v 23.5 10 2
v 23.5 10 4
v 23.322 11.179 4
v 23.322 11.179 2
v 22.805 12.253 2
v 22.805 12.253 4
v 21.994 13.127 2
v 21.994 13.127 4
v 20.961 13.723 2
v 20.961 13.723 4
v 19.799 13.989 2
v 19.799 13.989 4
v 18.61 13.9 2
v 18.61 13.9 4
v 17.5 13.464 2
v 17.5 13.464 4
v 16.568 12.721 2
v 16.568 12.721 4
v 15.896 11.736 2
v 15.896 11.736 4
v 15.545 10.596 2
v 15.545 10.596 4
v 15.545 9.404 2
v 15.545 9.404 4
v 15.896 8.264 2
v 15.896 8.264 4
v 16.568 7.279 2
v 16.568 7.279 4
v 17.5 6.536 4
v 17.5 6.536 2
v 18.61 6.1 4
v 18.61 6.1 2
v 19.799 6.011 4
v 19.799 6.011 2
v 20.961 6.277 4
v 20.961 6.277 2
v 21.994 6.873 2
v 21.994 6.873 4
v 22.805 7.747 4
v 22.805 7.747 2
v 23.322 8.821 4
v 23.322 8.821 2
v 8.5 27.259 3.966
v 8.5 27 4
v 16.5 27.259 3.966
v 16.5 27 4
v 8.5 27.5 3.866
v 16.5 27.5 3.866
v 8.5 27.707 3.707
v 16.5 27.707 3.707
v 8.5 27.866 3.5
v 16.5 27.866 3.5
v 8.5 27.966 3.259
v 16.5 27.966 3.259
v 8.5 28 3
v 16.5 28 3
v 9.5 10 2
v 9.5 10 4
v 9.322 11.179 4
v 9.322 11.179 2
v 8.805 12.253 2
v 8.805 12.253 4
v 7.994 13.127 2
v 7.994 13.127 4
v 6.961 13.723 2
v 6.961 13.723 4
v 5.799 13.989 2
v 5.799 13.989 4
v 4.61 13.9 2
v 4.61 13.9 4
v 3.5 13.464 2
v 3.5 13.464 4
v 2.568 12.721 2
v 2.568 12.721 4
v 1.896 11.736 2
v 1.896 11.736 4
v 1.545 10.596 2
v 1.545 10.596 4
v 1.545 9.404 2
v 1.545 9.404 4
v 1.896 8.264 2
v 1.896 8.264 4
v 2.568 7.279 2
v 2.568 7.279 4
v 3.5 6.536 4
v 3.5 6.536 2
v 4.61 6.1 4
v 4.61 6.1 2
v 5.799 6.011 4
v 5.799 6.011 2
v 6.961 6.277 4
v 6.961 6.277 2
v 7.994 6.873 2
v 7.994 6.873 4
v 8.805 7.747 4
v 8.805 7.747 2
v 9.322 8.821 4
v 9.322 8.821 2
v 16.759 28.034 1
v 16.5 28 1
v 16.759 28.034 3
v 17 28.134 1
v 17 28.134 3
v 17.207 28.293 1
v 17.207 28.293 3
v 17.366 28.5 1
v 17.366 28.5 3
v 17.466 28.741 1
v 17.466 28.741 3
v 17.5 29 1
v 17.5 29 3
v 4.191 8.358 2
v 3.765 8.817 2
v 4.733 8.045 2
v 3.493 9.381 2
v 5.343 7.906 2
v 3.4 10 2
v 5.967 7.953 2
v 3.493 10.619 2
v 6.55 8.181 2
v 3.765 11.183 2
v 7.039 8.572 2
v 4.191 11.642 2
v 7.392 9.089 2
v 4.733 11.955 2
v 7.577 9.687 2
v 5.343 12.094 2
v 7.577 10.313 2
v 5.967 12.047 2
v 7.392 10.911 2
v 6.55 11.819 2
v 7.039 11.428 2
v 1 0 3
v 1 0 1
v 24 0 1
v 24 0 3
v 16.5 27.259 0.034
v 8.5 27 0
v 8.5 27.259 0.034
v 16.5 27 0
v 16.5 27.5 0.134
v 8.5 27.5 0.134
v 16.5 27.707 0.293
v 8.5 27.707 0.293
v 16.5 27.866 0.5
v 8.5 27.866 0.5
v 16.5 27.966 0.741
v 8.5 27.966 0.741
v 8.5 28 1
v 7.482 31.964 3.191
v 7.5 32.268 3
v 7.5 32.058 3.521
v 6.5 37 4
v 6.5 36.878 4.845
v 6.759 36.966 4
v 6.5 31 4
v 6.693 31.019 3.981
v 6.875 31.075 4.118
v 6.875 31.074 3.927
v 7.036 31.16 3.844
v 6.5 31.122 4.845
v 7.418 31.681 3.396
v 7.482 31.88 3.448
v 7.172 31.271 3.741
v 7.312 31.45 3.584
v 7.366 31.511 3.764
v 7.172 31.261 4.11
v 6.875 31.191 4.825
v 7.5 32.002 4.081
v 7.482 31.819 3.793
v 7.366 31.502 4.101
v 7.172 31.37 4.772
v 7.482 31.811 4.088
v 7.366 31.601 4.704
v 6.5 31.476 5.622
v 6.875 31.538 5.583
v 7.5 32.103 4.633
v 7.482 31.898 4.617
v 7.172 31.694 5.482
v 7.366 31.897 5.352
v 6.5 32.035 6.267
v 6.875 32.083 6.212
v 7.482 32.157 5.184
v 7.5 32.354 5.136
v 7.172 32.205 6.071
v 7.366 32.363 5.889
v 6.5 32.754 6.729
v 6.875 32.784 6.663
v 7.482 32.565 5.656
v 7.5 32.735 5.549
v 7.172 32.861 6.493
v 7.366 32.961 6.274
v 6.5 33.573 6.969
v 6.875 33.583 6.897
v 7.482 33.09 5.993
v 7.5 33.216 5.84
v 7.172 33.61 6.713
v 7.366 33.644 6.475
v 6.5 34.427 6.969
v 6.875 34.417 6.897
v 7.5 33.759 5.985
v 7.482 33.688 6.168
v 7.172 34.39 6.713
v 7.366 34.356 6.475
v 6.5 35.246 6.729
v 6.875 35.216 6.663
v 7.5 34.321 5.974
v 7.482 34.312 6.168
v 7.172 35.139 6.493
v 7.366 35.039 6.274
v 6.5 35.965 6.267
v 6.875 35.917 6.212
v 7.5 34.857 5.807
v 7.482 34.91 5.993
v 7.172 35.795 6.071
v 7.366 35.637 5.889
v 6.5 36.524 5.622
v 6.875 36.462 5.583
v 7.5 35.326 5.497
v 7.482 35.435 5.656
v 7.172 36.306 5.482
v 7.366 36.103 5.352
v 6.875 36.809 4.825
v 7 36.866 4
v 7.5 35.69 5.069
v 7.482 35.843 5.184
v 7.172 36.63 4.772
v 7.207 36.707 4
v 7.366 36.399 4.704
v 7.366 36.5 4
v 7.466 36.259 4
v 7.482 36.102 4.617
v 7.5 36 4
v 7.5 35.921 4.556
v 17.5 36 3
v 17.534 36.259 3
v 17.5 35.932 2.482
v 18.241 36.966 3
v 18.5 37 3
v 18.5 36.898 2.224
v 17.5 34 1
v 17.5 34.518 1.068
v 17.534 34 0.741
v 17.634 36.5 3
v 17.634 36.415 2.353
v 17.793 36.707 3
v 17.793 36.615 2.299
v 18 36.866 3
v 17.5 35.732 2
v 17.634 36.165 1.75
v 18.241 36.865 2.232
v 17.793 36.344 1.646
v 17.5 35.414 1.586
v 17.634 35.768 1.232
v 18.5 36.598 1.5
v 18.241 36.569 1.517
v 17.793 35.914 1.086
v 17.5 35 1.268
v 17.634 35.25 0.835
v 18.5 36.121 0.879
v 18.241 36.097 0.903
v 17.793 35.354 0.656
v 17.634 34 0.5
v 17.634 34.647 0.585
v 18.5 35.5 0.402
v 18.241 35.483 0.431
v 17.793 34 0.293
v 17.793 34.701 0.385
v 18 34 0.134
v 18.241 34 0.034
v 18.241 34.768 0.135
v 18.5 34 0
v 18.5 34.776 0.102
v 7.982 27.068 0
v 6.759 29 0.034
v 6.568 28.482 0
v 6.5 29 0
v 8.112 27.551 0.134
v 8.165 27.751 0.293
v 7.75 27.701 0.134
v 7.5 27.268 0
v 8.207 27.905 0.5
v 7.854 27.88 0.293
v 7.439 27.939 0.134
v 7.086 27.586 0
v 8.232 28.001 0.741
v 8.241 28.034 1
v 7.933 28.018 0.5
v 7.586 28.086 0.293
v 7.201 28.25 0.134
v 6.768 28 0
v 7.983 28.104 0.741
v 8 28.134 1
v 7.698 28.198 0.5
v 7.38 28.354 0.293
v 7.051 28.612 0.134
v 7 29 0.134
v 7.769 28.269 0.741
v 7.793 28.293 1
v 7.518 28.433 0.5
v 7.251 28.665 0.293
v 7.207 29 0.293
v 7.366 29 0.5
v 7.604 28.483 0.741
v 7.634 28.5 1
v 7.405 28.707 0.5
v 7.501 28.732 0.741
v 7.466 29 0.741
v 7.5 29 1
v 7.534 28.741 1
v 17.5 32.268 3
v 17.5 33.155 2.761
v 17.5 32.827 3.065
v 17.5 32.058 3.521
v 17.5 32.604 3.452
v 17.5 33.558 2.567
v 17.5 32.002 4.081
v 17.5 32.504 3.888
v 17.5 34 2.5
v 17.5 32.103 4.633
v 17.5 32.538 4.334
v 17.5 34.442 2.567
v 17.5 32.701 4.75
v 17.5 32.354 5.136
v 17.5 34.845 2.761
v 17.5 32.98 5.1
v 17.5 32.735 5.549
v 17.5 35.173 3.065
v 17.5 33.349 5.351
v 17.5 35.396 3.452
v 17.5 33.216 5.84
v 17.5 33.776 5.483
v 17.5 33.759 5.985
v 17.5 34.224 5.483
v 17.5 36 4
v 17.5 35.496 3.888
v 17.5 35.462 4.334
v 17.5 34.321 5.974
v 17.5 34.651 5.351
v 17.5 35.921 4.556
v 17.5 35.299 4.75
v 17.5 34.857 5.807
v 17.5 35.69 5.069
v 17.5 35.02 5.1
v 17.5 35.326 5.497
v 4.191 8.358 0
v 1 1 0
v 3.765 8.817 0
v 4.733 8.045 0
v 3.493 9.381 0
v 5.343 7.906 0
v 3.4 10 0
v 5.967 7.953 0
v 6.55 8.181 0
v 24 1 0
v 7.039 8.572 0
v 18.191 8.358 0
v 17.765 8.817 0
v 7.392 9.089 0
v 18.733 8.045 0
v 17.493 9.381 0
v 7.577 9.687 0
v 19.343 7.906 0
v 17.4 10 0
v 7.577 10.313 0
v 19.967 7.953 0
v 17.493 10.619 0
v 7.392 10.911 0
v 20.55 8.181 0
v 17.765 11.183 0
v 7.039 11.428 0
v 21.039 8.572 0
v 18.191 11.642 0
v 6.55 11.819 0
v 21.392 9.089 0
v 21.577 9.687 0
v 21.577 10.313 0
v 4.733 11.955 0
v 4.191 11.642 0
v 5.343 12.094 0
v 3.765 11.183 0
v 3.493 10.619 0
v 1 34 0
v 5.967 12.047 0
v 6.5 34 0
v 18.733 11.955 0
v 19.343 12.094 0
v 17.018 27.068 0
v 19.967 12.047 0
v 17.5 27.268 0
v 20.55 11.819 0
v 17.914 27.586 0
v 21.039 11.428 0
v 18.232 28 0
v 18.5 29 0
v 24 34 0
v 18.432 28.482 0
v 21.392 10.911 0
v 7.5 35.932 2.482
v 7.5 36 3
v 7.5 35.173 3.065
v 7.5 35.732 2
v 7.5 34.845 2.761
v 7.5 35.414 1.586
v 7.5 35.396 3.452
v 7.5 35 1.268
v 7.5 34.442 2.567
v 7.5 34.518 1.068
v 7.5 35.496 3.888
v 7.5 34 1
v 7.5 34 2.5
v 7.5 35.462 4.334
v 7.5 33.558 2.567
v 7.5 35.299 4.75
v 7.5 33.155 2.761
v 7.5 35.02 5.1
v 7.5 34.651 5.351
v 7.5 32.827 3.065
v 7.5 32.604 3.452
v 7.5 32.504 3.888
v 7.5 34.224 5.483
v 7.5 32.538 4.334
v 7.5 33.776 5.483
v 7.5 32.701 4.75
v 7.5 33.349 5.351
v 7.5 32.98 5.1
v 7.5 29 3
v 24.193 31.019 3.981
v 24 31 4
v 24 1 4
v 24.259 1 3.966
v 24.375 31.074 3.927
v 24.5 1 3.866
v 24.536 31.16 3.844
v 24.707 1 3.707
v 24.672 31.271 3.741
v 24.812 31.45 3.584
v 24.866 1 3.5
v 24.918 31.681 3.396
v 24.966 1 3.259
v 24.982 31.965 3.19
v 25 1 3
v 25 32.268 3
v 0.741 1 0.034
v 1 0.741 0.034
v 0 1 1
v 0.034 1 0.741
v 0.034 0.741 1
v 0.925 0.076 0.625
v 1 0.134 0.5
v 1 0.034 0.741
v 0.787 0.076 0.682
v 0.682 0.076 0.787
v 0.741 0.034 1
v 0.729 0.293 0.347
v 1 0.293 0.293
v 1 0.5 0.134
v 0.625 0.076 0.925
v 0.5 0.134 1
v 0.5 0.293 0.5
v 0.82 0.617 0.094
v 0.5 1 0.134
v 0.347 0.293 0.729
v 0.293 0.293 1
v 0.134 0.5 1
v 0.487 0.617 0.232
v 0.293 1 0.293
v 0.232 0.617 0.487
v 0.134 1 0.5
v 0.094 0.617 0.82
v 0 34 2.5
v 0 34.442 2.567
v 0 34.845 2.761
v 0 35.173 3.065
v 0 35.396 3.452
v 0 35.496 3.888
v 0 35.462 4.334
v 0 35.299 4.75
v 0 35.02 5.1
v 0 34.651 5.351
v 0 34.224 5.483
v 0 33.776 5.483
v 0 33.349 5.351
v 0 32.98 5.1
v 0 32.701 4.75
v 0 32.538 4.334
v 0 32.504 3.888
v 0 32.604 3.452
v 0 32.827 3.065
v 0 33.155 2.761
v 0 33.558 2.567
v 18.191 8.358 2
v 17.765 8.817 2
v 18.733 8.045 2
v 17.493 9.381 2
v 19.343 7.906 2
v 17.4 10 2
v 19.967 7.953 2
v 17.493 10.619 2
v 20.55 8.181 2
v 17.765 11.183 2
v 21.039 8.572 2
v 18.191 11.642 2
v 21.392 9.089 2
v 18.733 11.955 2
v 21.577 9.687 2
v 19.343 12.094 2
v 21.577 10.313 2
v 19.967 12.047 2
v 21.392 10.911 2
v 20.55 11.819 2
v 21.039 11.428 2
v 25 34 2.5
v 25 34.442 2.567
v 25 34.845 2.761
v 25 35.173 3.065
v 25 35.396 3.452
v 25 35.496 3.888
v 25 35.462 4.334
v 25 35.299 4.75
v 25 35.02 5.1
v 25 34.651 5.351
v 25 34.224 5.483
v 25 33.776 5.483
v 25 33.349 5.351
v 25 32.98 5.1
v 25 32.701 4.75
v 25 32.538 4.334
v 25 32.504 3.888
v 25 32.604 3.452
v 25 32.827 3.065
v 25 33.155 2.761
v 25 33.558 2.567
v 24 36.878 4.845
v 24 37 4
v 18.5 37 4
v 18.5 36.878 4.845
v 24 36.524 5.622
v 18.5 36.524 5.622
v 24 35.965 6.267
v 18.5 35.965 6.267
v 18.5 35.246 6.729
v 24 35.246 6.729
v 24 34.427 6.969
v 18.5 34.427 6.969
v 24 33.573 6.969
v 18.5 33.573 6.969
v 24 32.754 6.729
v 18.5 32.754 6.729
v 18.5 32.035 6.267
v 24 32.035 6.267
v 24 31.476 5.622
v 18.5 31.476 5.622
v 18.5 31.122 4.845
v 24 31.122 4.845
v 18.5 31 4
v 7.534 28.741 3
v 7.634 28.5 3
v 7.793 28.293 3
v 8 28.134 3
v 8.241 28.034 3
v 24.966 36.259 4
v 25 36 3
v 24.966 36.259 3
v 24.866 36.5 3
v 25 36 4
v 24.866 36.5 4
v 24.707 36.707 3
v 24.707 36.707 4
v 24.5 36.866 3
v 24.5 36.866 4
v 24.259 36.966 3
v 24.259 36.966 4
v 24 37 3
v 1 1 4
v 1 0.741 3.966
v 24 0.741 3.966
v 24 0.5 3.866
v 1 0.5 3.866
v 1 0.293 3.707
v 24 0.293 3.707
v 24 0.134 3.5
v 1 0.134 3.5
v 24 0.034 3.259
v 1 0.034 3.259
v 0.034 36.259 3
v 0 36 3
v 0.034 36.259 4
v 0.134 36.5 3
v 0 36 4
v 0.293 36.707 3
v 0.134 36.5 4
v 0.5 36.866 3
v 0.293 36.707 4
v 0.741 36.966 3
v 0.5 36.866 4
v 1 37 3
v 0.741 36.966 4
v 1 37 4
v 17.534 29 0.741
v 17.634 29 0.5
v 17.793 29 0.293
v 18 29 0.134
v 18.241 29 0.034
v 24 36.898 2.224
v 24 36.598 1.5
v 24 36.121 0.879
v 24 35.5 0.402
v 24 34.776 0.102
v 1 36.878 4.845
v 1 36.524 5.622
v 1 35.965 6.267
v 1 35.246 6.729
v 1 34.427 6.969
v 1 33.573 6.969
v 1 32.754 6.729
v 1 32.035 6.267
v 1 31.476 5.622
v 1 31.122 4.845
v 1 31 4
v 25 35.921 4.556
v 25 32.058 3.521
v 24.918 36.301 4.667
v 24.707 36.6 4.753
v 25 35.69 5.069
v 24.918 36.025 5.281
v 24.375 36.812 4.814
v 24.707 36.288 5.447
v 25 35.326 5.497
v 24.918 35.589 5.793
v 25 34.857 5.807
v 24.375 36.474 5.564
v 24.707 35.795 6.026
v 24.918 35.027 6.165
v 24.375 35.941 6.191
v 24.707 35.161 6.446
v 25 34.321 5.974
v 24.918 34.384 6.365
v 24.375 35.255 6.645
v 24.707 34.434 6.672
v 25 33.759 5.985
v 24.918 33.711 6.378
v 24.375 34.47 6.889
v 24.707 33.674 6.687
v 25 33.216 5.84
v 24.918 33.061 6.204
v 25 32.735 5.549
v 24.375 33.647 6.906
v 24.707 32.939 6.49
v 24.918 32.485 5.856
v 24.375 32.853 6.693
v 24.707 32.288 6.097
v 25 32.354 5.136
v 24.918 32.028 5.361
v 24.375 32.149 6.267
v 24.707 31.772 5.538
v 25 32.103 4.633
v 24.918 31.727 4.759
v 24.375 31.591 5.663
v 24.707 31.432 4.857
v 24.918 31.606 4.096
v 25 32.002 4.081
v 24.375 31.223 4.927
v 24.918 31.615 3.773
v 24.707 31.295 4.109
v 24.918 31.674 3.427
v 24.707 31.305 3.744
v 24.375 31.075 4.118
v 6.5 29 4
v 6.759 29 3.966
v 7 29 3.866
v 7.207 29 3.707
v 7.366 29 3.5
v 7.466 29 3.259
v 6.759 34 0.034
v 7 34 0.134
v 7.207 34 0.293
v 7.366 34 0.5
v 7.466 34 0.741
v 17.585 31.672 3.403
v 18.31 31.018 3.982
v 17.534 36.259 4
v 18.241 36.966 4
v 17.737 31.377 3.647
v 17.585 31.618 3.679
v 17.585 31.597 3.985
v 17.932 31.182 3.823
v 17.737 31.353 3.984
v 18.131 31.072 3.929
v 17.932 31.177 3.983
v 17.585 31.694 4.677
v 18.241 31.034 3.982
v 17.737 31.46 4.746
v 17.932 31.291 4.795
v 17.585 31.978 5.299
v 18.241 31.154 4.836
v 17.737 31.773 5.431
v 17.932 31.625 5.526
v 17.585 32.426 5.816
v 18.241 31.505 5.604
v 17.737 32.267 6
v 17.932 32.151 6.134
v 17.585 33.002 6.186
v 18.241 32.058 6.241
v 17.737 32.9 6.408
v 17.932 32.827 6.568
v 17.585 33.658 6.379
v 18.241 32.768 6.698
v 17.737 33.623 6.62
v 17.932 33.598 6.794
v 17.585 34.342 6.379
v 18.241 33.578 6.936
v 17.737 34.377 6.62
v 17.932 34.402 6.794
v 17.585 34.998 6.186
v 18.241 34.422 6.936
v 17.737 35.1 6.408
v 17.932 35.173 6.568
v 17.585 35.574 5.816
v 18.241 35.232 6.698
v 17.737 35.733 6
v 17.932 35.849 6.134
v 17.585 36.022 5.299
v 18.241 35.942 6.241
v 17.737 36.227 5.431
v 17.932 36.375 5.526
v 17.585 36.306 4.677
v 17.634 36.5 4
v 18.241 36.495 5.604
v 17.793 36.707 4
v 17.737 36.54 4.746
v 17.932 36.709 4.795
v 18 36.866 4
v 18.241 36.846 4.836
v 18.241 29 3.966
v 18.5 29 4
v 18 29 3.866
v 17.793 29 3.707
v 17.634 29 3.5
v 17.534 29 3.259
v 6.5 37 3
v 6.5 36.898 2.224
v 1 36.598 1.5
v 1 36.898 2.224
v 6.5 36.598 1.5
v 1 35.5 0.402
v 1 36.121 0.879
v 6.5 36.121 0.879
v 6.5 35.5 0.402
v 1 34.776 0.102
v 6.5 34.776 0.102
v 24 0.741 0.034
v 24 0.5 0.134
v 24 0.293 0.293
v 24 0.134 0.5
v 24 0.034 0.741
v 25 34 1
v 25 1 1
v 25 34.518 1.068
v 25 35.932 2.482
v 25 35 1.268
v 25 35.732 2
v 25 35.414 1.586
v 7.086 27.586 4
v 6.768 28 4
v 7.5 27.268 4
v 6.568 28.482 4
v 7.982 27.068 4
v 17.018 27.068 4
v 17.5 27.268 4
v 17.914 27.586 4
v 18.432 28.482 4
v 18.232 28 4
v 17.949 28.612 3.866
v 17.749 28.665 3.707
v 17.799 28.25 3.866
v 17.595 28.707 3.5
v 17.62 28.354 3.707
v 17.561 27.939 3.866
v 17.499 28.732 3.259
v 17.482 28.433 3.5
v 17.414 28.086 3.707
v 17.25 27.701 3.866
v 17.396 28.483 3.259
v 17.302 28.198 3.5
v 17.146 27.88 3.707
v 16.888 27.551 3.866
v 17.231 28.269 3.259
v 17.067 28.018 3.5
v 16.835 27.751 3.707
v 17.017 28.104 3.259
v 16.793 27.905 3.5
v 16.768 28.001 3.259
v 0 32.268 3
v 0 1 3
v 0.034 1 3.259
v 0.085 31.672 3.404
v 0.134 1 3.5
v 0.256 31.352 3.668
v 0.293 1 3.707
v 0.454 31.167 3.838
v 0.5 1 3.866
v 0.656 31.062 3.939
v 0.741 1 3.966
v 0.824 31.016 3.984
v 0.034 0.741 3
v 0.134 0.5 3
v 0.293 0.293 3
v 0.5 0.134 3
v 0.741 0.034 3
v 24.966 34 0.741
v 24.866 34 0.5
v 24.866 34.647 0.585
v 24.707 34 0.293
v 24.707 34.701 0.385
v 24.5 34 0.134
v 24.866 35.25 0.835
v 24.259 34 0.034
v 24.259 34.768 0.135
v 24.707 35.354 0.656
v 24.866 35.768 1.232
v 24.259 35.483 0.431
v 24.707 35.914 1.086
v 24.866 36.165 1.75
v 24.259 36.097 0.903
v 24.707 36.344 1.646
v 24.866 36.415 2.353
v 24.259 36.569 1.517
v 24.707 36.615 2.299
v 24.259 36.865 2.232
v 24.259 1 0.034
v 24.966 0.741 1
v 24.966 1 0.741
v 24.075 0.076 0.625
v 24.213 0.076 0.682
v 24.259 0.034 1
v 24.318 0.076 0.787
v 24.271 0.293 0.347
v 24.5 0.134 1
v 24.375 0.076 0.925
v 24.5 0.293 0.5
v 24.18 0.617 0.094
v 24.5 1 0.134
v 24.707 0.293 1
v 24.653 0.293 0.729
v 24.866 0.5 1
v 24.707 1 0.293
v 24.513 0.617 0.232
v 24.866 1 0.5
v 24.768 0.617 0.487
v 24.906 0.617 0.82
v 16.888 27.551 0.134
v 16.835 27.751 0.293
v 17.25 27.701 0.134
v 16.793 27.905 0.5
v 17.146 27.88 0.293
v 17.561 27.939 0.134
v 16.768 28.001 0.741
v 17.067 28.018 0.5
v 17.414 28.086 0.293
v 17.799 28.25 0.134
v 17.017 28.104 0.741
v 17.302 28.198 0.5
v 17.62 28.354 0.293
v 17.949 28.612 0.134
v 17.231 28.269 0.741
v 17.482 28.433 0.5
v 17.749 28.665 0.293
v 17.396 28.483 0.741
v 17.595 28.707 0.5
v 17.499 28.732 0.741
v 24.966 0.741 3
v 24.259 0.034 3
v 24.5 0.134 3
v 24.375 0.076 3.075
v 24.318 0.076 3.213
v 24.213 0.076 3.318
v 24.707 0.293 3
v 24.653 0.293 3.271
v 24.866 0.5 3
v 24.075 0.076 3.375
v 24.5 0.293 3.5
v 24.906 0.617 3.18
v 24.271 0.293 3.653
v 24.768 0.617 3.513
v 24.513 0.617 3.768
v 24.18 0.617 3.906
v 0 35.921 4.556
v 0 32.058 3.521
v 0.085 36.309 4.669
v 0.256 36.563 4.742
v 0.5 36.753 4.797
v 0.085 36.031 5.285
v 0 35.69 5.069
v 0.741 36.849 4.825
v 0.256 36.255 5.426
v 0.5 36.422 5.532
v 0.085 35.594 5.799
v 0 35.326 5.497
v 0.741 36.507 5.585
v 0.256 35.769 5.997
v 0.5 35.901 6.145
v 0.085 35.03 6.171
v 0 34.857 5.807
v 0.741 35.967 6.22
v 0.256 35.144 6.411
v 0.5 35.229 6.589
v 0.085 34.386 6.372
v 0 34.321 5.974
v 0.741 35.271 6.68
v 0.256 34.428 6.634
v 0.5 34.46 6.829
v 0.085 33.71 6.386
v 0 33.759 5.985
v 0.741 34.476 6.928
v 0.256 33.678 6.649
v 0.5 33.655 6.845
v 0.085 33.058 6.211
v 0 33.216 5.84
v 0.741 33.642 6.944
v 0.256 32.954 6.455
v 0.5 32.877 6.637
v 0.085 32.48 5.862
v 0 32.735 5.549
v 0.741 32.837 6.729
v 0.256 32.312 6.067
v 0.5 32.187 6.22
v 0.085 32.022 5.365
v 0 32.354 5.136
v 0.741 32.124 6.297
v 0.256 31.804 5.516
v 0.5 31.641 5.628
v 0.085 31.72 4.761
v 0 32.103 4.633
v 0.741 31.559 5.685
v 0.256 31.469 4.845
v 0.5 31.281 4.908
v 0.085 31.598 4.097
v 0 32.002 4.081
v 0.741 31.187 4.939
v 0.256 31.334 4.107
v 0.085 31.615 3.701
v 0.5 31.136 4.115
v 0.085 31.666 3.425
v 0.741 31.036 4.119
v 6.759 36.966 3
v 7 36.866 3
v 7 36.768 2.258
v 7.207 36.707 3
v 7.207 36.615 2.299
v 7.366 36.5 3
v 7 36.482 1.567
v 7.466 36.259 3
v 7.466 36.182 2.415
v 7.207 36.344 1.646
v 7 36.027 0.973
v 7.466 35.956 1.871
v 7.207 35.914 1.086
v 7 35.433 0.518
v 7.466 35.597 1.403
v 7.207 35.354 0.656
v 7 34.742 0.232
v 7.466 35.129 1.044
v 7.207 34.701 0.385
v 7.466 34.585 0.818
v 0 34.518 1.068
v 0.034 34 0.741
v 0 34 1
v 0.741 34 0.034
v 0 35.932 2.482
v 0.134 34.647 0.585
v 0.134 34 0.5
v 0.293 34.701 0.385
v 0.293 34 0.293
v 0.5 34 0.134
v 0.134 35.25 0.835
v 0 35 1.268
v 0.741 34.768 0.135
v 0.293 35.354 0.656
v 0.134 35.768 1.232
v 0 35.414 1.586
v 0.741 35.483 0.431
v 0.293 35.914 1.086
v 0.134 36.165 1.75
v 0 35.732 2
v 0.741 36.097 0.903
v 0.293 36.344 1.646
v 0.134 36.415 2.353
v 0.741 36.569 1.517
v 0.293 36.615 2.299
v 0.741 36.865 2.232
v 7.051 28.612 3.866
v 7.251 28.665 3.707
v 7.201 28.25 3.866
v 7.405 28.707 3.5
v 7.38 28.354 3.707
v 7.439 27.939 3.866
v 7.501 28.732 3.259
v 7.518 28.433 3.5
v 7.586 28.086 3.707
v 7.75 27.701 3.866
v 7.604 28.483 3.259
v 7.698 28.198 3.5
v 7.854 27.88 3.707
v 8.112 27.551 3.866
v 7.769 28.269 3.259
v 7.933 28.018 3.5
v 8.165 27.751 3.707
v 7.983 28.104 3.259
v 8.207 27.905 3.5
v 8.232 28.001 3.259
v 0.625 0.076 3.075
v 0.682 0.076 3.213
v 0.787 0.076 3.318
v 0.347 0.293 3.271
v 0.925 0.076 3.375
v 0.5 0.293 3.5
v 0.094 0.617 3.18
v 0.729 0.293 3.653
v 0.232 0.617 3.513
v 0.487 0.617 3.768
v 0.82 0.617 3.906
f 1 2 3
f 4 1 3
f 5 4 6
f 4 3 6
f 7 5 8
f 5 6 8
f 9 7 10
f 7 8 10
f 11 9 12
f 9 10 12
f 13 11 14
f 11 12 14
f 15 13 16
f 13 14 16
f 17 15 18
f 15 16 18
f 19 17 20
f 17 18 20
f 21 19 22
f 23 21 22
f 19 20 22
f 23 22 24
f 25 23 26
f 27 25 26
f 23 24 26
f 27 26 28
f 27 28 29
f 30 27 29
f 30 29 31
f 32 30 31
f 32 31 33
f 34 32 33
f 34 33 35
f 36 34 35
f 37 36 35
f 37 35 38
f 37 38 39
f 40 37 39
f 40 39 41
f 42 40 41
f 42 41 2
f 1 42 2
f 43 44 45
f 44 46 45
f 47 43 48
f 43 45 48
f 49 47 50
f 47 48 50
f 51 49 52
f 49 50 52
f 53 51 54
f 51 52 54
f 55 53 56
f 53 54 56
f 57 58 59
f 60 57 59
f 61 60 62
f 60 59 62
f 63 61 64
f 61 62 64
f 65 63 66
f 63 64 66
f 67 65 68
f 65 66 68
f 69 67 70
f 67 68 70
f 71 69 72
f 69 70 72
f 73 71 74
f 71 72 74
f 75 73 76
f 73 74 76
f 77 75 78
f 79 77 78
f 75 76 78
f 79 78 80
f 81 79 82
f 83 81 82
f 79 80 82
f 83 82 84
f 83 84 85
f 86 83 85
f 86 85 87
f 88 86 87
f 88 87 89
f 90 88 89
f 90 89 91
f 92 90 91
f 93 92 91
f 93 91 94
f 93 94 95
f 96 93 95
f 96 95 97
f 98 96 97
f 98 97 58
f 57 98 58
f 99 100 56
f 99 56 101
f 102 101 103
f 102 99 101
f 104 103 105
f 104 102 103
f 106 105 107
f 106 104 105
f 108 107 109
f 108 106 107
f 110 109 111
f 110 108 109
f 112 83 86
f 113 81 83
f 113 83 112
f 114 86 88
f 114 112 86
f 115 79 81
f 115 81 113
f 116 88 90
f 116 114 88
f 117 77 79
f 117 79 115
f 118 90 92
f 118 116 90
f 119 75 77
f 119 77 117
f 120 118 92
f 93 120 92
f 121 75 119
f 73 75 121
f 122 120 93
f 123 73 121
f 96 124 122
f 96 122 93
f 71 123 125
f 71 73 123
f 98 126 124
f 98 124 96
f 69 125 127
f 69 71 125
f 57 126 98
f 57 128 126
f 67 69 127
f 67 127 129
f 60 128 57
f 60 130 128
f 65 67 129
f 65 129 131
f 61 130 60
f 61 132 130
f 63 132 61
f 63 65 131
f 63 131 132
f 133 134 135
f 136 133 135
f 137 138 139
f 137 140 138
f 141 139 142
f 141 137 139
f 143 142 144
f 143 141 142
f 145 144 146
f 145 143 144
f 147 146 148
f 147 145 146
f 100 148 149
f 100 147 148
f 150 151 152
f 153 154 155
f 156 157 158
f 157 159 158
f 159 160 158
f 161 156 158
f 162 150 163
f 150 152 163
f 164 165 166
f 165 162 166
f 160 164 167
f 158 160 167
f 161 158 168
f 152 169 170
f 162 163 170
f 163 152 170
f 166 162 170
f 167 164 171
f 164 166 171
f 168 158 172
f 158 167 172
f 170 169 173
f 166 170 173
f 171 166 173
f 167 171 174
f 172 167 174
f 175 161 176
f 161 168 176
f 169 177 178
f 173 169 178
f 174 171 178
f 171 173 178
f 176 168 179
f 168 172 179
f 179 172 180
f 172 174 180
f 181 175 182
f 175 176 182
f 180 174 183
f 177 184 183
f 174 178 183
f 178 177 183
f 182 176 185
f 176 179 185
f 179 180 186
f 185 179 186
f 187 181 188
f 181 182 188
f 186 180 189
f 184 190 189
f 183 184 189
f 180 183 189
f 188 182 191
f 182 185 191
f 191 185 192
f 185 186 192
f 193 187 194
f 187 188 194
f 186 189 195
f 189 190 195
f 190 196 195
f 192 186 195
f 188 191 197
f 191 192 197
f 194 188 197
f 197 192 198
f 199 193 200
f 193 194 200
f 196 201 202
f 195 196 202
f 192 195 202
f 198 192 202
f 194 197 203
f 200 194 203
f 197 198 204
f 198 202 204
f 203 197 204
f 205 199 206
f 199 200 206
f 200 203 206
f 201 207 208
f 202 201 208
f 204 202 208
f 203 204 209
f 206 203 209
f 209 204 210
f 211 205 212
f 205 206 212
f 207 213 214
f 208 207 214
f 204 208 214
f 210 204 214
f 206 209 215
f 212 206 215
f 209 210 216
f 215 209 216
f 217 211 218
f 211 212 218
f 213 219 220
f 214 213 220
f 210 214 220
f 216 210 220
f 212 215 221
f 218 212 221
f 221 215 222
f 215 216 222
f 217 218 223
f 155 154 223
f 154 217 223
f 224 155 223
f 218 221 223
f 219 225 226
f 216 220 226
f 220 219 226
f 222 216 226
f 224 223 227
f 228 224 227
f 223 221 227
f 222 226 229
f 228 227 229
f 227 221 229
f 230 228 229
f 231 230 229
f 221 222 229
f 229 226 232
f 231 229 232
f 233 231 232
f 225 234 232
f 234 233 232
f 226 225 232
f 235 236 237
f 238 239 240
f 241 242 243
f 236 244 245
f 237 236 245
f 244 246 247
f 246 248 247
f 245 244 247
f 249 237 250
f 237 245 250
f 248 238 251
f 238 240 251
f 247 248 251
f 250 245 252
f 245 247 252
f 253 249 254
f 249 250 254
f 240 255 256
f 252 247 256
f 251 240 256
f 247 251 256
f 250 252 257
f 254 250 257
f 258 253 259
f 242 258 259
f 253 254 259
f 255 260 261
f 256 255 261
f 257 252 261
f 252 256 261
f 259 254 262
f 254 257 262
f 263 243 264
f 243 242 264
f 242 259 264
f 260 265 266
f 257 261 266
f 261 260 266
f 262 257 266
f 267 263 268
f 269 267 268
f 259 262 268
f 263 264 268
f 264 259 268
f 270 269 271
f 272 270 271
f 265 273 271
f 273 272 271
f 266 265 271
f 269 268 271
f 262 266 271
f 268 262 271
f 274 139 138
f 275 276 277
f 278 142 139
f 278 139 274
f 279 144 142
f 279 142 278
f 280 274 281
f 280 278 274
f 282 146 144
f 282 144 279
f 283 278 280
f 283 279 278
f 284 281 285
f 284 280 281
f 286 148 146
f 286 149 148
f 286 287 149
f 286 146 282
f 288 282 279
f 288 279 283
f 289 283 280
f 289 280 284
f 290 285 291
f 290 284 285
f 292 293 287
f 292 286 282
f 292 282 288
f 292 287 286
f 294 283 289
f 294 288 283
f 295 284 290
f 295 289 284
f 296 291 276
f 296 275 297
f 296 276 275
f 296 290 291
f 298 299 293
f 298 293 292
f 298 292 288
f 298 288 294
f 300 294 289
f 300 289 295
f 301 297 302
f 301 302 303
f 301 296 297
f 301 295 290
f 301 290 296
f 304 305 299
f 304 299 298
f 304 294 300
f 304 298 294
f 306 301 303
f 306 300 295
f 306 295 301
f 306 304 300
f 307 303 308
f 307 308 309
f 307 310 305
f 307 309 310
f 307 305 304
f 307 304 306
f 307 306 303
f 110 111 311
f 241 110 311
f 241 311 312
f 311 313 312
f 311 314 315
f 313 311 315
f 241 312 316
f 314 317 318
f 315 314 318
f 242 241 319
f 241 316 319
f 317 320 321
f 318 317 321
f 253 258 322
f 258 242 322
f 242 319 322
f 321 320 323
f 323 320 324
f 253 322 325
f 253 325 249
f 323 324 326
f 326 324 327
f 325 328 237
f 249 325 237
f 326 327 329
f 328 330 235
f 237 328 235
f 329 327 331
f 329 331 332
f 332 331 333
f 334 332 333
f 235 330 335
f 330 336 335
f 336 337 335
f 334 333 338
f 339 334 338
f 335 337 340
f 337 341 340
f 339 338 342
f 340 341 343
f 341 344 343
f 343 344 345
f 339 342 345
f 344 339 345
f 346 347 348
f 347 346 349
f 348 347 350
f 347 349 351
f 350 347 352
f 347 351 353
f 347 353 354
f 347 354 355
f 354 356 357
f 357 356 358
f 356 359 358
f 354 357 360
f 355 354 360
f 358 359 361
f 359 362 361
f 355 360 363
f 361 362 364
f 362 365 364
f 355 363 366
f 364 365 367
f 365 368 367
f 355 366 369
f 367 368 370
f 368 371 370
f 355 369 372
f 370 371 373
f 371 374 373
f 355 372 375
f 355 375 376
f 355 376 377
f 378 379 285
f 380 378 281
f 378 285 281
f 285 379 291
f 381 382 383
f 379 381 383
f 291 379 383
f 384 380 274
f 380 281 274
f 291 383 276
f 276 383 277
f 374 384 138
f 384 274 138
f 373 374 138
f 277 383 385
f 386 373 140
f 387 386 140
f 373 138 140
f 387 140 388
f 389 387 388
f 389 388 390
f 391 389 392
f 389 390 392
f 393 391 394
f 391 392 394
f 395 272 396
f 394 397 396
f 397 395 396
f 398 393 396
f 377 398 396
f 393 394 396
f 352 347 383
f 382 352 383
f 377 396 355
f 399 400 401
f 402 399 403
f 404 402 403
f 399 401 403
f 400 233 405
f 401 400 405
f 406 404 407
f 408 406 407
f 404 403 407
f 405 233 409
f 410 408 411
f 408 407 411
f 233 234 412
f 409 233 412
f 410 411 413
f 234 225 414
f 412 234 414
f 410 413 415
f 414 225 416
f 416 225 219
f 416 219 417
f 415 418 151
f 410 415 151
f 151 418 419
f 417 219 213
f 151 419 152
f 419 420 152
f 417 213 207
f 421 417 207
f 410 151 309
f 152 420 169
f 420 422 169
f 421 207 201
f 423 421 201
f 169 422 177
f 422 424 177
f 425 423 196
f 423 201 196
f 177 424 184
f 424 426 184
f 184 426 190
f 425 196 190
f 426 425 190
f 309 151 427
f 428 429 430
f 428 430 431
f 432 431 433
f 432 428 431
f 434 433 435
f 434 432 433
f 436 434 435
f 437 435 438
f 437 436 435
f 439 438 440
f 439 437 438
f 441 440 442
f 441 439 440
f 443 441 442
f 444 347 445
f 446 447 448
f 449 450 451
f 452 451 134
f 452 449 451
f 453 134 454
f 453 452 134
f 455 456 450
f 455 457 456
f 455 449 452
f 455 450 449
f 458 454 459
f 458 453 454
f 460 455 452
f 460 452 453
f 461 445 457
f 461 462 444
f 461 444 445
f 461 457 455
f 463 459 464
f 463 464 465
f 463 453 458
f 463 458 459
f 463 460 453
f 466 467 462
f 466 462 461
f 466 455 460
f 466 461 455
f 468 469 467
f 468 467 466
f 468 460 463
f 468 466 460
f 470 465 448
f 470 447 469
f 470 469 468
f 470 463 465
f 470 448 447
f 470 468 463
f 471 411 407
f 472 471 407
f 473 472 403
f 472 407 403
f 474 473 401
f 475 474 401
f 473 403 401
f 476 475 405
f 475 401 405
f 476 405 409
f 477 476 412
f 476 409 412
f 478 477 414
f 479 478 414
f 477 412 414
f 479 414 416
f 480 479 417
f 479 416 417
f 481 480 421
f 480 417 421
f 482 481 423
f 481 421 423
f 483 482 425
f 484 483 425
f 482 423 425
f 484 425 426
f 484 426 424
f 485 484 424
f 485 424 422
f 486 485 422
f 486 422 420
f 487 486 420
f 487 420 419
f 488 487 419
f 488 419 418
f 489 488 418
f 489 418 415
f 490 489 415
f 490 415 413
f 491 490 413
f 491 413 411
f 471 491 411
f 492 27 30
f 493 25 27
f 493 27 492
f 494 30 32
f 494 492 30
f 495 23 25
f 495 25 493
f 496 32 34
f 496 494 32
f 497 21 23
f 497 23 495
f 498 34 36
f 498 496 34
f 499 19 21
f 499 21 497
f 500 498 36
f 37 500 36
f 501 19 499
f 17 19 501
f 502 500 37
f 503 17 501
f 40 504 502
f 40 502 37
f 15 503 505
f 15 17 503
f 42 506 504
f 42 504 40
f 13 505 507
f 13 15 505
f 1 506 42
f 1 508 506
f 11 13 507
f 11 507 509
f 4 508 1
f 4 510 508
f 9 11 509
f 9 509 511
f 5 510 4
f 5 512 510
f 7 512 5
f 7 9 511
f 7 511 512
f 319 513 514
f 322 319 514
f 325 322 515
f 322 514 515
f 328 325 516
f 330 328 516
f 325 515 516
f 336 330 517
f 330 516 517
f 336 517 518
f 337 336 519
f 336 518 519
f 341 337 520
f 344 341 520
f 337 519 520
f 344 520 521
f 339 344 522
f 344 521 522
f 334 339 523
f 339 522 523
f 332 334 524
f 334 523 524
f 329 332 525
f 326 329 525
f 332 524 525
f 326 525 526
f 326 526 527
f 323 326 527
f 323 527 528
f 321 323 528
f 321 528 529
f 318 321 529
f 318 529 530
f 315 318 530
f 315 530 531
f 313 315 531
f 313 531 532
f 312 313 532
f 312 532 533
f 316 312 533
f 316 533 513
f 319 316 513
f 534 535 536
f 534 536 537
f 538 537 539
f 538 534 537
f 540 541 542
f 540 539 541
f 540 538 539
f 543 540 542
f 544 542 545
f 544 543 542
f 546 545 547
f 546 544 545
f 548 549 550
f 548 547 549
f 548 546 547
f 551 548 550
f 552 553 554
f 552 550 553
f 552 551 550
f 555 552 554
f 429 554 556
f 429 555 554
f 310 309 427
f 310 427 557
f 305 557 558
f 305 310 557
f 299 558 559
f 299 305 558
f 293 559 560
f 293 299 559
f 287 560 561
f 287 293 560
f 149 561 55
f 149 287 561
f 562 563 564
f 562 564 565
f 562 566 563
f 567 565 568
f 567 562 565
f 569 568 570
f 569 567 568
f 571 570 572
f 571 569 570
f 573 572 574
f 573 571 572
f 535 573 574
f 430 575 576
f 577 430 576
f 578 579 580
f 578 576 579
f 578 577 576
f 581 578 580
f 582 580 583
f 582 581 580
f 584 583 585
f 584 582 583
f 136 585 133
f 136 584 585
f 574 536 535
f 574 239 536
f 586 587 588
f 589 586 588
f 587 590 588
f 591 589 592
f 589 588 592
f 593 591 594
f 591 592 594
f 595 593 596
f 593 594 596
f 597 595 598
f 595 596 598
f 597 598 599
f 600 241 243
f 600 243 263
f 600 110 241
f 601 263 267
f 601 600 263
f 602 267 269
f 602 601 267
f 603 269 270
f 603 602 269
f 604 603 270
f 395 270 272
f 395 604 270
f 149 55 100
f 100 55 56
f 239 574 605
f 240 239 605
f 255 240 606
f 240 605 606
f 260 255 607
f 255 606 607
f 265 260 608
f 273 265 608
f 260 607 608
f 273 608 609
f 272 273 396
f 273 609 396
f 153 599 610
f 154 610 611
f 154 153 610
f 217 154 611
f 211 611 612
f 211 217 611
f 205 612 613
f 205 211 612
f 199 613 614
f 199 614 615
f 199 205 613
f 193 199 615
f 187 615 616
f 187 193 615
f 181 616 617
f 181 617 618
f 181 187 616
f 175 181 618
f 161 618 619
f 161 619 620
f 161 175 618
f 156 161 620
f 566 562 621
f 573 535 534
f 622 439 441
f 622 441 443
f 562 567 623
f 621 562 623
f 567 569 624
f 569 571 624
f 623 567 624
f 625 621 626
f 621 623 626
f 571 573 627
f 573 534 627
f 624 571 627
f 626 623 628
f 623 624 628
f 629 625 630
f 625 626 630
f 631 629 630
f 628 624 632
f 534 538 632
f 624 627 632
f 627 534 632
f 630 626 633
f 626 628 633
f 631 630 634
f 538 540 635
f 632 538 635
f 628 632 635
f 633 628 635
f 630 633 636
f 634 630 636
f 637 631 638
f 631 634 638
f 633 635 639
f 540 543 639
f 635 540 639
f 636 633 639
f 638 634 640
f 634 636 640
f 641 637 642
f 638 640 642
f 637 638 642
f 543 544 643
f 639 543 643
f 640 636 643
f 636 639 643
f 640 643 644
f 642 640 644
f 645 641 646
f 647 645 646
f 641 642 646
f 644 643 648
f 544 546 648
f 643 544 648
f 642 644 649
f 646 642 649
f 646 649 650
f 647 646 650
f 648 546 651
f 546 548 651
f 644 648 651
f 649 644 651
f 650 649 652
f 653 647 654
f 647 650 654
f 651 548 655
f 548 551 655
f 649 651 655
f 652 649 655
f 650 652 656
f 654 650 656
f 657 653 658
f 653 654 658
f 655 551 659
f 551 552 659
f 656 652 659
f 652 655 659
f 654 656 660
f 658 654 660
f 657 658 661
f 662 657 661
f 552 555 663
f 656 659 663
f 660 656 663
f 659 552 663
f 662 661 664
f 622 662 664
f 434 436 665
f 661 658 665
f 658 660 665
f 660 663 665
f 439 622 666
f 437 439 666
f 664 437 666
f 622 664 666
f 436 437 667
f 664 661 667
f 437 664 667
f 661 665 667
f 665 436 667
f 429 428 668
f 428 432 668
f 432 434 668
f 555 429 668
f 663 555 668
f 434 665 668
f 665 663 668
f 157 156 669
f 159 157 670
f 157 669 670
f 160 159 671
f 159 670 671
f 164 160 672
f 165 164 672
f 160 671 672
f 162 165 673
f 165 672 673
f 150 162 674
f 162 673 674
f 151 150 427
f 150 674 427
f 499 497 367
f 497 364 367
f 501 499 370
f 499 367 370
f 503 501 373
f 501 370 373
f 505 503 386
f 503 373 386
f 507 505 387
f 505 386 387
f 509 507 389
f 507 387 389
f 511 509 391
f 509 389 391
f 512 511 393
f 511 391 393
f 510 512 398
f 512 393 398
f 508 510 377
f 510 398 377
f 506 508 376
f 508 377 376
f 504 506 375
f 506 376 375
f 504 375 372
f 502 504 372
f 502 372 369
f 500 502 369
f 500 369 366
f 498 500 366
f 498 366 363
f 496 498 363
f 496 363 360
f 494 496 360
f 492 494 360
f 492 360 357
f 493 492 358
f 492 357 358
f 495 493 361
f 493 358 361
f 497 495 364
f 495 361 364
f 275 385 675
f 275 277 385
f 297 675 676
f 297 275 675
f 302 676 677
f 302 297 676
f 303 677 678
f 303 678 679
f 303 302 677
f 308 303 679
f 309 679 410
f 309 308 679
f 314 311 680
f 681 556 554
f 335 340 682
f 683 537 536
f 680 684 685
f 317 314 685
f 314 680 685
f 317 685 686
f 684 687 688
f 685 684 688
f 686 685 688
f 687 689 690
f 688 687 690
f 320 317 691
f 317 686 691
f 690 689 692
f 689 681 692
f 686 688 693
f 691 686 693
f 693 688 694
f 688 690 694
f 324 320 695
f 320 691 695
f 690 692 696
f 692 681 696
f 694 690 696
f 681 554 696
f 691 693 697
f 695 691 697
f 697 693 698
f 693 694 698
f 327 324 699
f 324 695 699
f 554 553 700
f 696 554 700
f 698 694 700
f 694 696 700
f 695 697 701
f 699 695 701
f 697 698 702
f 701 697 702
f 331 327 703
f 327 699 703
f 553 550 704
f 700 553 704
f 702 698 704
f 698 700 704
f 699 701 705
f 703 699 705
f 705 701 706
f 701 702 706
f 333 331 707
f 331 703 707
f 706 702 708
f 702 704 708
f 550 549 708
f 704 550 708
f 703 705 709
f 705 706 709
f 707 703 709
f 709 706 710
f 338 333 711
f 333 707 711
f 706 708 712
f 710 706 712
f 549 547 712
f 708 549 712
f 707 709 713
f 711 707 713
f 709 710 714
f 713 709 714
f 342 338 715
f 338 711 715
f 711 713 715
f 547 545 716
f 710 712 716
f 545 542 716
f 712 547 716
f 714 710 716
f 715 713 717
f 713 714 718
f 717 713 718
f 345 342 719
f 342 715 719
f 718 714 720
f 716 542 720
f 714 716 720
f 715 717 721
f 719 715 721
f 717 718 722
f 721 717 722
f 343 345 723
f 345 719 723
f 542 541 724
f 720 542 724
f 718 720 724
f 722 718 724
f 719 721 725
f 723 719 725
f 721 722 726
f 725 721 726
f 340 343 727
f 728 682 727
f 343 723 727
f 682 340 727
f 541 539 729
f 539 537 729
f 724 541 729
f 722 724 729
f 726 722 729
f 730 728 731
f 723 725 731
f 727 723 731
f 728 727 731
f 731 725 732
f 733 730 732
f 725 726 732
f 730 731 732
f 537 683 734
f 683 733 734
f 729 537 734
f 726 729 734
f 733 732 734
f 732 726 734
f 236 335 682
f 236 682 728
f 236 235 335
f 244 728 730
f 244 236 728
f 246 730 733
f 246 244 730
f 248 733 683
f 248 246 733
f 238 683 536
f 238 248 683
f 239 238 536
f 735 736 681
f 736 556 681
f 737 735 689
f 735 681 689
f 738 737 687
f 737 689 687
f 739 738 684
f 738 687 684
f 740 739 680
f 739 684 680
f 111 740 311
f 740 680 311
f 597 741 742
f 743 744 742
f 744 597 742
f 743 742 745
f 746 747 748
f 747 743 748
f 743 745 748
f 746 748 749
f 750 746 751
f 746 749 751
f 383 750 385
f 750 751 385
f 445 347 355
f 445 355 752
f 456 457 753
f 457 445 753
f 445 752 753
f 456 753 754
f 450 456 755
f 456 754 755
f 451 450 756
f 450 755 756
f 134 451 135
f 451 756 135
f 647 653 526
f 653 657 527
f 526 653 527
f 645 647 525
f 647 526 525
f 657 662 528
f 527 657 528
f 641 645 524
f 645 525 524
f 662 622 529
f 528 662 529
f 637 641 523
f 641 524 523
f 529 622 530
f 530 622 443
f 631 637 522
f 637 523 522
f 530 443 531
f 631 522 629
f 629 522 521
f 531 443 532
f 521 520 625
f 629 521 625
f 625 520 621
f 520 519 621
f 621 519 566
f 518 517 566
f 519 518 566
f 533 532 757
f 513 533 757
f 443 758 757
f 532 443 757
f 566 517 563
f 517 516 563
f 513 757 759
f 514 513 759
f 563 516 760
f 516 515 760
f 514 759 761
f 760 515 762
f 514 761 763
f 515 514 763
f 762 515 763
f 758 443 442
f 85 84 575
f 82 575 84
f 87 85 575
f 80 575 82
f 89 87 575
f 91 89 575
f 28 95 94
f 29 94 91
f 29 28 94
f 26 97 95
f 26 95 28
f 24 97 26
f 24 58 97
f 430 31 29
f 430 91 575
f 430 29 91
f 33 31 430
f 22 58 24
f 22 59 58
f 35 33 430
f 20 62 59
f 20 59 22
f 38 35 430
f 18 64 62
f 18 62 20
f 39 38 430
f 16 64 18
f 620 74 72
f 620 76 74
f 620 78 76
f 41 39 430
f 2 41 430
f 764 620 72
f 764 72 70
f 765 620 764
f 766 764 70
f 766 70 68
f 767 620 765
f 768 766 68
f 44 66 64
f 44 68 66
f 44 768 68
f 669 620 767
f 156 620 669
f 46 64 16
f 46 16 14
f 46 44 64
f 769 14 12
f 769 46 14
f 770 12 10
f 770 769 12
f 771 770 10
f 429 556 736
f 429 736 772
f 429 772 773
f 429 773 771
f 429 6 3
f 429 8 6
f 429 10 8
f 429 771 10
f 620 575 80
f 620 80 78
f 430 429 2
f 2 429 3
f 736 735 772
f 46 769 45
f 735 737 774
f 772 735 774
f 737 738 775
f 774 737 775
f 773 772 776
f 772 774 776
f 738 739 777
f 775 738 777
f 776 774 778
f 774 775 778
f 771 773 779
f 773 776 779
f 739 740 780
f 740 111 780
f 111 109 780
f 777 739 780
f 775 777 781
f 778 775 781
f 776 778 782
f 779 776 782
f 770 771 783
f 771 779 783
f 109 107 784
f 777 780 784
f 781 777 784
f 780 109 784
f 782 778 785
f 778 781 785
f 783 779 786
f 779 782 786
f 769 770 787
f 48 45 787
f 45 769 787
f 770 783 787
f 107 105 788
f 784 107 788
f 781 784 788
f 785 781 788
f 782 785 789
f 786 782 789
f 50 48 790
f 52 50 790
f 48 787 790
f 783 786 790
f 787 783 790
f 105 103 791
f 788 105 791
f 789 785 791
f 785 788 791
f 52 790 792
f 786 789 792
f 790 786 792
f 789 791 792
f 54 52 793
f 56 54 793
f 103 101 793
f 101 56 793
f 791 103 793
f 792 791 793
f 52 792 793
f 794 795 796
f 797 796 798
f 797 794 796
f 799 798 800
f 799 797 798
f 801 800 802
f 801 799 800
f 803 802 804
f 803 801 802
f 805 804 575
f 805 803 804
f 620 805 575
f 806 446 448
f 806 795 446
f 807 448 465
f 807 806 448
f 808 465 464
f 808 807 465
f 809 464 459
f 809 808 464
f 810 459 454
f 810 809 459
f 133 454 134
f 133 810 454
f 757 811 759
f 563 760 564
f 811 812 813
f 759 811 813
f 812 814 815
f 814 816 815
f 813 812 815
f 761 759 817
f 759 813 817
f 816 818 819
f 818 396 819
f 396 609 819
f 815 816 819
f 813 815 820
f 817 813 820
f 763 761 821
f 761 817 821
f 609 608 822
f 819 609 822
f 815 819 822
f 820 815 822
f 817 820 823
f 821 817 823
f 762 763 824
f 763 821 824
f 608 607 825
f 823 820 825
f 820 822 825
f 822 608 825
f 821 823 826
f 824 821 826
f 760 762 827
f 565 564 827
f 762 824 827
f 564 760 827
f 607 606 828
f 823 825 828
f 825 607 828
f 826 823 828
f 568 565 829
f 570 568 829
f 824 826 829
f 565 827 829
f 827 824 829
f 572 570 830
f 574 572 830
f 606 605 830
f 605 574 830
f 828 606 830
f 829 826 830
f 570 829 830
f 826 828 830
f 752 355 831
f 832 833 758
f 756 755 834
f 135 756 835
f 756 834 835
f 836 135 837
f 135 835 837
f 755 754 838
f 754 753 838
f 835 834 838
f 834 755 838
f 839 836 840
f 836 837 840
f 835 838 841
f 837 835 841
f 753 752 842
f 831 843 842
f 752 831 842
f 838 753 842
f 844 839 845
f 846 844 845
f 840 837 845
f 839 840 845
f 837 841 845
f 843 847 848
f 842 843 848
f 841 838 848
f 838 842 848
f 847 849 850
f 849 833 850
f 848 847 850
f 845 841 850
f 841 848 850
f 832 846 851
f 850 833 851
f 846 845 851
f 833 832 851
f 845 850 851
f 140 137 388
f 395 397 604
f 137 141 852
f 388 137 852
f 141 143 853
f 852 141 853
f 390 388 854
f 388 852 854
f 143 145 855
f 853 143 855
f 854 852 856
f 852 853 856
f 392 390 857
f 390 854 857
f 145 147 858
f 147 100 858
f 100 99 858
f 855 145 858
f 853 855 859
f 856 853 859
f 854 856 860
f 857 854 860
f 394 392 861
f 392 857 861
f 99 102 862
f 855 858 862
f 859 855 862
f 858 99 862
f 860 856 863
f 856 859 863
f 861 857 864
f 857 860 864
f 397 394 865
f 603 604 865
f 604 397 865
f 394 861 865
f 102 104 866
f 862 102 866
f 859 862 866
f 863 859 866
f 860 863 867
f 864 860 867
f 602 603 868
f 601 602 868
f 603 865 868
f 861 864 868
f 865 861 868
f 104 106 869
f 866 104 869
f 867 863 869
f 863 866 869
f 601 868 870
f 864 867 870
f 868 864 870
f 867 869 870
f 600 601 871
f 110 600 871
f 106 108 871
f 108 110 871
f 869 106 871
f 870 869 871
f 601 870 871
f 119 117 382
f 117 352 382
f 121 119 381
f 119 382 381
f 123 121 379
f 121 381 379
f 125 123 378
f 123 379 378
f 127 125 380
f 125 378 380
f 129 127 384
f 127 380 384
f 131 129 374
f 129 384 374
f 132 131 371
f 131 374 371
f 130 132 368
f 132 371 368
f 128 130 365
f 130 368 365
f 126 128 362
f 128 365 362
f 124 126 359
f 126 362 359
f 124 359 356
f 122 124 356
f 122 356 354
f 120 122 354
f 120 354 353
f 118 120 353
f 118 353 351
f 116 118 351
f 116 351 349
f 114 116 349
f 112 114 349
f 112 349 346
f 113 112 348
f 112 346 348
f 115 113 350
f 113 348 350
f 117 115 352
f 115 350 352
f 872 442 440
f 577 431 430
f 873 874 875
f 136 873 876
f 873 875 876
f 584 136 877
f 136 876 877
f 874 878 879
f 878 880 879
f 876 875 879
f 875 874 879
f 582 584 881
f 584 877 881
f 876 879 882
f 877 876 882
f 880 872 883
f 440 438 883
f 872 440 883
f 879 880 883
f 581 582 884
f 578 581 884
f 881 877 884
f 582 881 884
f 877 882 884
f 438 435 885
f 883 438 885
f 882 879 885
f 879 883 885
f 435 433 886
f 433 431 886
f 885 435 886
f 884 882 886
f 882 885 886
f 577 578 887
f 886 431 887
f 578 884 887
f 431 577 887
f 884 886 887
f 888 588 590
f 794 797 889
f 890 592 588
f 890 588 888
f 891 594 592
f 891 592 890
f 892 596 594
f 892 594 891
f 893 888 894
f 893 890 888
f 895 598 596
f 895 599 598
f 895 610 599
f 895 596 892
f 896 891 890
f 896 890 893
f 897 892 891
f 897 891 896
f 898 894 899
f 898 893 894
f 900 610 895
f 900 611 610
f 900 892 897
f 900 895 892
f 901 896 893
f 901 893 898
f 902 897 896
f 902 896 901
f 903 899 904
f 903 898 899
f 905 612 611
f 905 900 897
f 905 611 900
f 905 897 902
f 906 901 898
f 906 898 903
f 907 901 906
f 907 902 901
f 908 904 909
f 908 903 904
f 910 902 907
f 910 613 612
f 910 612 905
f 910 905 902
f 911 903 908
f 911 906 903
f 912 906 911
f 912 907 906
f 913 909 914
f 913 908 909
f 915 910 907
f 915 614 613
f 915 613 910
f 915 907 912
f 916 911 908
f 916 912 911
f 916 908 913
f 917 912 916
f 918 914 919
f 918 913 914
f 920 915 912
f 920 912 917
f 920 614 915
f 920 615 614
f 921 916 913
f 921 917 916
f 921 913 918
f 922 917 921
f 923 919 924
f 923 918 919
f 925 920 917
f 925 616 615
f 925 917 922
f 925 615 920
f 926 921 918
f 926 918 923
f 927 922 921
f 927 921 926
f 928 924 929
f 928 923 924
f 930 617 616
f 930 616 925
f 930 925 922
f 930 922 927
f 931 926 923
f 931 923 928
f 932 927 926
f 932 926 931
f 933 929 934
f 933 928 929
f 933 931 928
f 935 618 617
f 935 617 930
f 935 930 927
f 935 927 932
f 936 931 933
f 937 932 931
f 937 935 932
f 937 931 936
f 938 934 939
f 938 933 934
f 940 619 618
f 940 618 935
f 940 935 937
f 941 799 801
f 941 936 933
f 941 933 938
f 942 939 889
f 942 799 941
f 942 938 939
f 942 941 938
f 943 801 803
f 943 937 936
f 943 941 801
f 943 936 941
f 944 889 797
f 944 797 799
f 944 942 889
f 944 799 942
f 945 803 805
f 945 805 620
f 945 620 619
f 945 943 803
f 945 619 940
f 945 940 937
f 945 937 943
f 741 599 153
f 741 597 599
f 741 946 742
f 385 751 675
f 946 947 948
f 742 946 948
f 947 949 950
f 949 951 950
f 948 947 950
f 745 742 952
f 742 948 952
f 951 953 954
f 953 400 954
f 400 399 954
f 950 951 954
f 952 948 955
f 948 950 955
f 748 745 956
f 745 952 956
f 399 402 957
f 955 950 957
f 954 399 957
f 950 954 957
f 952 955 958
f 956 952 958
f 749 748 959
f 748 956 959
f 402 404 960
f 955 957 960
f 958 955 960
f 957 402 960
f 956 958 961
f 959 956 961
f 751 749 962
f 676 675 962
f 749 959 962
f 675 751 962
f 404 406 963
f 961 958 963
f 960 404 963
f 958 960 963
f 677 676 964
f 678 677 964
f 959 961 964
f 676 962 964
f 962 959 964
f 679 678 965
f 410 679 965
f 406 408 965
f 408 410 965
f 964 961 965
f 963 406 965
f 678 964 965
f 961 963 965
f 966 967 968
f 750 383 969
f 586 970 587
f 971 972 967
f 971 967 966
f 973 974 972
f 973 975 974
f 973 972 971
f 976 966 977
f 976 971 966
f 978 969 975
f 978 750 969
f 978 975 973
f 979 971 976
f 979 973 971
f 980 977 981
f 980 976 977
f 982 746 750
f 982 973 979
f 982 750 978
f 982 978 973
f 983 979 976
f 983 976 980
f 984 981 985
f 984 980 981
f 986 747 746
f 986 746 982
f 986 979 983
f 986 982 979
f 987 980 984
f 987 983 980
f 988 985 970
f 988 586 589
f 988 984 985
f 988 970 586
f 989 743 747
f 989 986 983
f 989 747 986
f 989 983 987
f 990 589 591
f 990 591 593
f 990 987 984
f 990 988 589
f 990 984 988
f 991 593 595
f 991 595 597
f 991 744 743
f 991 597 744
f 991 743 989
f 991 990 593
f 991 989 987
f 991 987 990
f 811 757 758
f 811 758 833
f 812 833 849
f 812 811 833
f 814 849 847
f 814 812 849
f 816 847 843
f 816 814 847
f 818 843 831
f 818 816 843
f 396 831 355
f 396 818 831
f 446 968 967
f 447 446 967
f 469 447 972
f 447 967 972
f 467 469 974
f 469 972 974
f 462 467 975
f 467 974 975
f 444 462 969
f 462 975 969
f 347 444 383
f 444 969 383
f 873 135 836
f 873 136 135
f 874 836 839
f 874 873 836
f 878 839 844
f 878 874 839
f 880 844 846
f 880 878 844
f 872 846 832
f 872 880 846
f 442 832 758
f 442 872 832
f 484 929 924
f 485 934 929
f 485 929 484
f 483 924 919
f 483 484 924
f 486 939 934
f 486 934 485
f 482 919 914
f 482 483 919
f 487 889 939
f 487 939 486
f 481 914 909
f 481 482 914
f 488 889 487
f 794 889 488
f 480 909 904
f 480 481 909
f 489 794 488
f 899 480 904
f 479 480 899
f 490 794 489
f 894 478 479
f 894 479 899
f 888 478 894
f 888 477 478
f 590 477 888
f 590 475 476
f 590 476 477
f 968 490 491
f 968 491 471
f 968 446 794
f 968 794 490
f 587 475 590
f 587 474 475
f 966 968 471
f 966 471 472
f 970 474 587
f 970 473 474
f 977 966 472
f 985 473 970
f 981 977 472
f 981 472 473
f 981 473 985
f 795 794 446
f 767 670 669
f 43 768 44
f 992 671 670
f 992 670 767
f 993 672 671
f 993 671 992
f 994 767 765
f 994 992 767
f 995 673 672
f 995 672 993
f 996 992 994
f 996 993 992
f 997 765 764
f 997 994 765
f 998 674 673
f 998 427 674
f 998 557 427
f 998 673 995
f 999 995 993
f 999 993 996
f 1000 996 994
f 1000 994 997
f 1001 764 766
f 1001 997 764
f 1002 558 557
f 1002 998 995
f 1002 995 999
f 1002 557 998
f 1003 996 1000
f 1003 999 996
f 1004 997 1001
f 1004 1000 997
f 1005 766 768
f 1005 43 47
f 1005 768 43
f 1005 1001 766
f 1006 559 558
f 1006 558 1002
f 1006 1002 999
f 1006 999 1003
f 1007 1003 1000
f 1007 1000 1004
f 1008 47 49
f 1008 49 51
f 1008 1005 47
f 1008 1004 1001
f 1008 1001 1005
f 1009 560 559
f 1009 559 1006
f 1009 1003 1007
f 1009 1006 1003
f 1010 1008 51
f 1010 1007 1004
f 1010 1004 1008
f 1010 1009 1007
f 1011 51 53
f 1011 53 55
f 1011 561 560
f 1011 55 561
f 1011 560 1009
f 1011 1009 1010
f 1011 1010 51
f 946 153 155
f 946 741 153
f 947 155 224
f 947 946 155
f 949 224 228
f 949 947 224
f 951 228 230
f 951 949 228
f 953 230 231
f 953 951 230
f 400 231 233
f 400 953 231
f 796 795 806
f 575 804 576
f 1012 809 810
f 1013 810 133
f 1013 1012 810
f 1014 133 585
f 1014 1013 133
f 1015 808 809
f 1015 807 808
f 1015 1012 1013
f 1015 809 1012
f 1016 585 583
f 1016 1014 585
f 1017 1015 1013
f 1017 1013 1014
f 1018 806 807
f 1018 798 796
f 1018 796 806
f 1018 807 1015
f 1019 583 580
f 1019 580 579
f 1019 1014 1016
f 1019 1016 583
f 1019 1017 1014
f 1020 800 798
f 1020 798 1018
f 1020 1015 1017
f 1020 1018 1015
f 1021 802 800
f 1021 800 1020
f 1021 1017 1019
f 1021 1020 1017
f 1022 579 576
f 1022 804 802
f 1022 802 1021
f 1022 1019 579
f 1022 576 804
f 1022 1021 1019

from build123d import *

# Parameters (mm, degrees)
ESQUISSE1_W                                       = 25
ESQUISSE1_H                                       = 37
BOSS_EXTRU_1_DEPTH                                = 4
ESQUISSE2_R                                       = 3
BOSS_EXTRU_2_DEPTH                                = 25
ESQUISSE3_R                                       = 1.5
ENL_V_MAT_EXTRU_1_DEPTH                           = 25
ENL_V_MAT_EXTRU_2_DEPTH                           = 25
ENL_V_MAT_EXTRU_2_DEPTH_BACK                      = 25
ESQUISSE4_W                                       = 10
ESQUISSE4_H                                       = 9
CHAMBRAGE_POUR_VIS_SIX_PANS_CREUX_M41_D           = 4.2
CHAMBRAGE_POUR_VIS_SIX_PANS_CREUX_M41_CBORE_D     = 8
CHAMBRAGE_POUR_VIS_SIX_PANS_CREUX_M41_CBORE_DEPTH = 2
CONG_1_R                                          = 1


with BuildPart() as part:
    # Esquisse1 → Boss.-Extru.1 (new body)
    with BuildSketch(Plane.XY):
        with Locations((12.5, 18.5)):
            Rectangle(ESQUISSE1_W, ESQUISSE1_H)
    extrude(amount=BOSS_EXTRU_1_DEPTH)

    # Esquisse2 → Boss.-Extru.2 (add)
    with BuildSketch(Plane(origin=(25, 0, 0), x_dir=(0, 0, -1), z_dir=(1, 0, 0))):
        with Locations((-4, 34)):
            Circle(ESQUISSE2_R)
    extrude(amount=-BOSS_EXTRU_2_DEPTH)

    # Esquisse3 → Enlèv. mat.-Extru.1 (cut)
    with BuildSketch(Plane(origin=(25, 0, 0), x_dir=(0, 0, -1), z_dir=(1, 0, 0))):
        with BuildLine():
            Line((0, 34), (0, 37))
            Line((0, 37), (-3, 37))
            ThreePointArc((-3, 37), (-0.878679656, 36.121320344), (0, 34))
        make_face()
        with Locations((-4, 34)):
            Circle(ESQUISSE3_R)
    extrude(amount=-ENL_V_MAT_EXTRU_1_DEPTH, mode=Mode.SUBTRACT)

    # Esquisse4 → Enlèv. mat.-Extru.2 (cut, two sides: drawn at the far end of the back side and taken through both)
    with BuildSketch(Plane.XY.offset(4).offset(-ENL_V_MAT_EXTRU_2_DEPTH_BACK)):
        with Locations((12.5, 32.5)):
            Rectangle(ESQUISSE4_W, ESQUISSE4_H)
    extrude(amount=ENL_V_MAT_EXTRU_2_DEPTH + ENL_V_MAT_EXTRU_2_DEPTH_BACK, mode=Mode.SUBTRACT)

    # Chambrage pour vis à six pans creux M41 (through all)
    with Locations(Plane(origin=(5.5, 10, 4), x_dir=(1, 0, 0), z_dir=(0, 0, 1))):
        with Locations((0, 0), (14, 0)):
            CounterBoreHole(CHAMBRAGE_POUR_VIS_SIX_PANS_CREUX_M41_D / 2, CHAMBRAGE_POUR_VIS_SIX_PANS_CREUX_M41_CBORE_D / 2, CHAMBRAGE_POUR_VIS_SIX_PANS_CREUX_M41_CBORE_DEPTH)

    # Congé1
    cong_1_edges = [part.edges().sort_by_distance(p)[0] for p in [
        (7.5, 34, 7),
        (17.5, 34, 7),
        (7.5, 37, 3.5),
        (17.5, 37, 3.5),
        (7.5, 36.121320344, 0.878679656),
        (17.5, 36.121320344, 0.878679656),
        (7.5, 29.5, 4),
        (7.5, 31, 0),
        (17.5, 29.5, 4),
        (17.5, 31, 0),
        (25, 34, 7),
        (25, 37, 3.5),
        (25, 36.121320344, 0.878679656),
        (0, 34, 7),
        (0, 37, 3.5),
        (0, 36.121320344, 0.878679656),
        (0, 0, 2),
        (12.5, 0, 4),
        (25, 0, 2),
        (12.5, 0, 0),
        (7.5, 28, 2),
        (17.5, 28, 2),
        (12.5, 28, 0),
        (12.5, 28, 4),
        (25, 15.5, 4),
        (25, 17, 0),
        (0, 15.5, 4),
        (0, 17, 0),
    ]]
    fillet(cong_1_edges, radius=CONG_1_R)


solid = part.part
